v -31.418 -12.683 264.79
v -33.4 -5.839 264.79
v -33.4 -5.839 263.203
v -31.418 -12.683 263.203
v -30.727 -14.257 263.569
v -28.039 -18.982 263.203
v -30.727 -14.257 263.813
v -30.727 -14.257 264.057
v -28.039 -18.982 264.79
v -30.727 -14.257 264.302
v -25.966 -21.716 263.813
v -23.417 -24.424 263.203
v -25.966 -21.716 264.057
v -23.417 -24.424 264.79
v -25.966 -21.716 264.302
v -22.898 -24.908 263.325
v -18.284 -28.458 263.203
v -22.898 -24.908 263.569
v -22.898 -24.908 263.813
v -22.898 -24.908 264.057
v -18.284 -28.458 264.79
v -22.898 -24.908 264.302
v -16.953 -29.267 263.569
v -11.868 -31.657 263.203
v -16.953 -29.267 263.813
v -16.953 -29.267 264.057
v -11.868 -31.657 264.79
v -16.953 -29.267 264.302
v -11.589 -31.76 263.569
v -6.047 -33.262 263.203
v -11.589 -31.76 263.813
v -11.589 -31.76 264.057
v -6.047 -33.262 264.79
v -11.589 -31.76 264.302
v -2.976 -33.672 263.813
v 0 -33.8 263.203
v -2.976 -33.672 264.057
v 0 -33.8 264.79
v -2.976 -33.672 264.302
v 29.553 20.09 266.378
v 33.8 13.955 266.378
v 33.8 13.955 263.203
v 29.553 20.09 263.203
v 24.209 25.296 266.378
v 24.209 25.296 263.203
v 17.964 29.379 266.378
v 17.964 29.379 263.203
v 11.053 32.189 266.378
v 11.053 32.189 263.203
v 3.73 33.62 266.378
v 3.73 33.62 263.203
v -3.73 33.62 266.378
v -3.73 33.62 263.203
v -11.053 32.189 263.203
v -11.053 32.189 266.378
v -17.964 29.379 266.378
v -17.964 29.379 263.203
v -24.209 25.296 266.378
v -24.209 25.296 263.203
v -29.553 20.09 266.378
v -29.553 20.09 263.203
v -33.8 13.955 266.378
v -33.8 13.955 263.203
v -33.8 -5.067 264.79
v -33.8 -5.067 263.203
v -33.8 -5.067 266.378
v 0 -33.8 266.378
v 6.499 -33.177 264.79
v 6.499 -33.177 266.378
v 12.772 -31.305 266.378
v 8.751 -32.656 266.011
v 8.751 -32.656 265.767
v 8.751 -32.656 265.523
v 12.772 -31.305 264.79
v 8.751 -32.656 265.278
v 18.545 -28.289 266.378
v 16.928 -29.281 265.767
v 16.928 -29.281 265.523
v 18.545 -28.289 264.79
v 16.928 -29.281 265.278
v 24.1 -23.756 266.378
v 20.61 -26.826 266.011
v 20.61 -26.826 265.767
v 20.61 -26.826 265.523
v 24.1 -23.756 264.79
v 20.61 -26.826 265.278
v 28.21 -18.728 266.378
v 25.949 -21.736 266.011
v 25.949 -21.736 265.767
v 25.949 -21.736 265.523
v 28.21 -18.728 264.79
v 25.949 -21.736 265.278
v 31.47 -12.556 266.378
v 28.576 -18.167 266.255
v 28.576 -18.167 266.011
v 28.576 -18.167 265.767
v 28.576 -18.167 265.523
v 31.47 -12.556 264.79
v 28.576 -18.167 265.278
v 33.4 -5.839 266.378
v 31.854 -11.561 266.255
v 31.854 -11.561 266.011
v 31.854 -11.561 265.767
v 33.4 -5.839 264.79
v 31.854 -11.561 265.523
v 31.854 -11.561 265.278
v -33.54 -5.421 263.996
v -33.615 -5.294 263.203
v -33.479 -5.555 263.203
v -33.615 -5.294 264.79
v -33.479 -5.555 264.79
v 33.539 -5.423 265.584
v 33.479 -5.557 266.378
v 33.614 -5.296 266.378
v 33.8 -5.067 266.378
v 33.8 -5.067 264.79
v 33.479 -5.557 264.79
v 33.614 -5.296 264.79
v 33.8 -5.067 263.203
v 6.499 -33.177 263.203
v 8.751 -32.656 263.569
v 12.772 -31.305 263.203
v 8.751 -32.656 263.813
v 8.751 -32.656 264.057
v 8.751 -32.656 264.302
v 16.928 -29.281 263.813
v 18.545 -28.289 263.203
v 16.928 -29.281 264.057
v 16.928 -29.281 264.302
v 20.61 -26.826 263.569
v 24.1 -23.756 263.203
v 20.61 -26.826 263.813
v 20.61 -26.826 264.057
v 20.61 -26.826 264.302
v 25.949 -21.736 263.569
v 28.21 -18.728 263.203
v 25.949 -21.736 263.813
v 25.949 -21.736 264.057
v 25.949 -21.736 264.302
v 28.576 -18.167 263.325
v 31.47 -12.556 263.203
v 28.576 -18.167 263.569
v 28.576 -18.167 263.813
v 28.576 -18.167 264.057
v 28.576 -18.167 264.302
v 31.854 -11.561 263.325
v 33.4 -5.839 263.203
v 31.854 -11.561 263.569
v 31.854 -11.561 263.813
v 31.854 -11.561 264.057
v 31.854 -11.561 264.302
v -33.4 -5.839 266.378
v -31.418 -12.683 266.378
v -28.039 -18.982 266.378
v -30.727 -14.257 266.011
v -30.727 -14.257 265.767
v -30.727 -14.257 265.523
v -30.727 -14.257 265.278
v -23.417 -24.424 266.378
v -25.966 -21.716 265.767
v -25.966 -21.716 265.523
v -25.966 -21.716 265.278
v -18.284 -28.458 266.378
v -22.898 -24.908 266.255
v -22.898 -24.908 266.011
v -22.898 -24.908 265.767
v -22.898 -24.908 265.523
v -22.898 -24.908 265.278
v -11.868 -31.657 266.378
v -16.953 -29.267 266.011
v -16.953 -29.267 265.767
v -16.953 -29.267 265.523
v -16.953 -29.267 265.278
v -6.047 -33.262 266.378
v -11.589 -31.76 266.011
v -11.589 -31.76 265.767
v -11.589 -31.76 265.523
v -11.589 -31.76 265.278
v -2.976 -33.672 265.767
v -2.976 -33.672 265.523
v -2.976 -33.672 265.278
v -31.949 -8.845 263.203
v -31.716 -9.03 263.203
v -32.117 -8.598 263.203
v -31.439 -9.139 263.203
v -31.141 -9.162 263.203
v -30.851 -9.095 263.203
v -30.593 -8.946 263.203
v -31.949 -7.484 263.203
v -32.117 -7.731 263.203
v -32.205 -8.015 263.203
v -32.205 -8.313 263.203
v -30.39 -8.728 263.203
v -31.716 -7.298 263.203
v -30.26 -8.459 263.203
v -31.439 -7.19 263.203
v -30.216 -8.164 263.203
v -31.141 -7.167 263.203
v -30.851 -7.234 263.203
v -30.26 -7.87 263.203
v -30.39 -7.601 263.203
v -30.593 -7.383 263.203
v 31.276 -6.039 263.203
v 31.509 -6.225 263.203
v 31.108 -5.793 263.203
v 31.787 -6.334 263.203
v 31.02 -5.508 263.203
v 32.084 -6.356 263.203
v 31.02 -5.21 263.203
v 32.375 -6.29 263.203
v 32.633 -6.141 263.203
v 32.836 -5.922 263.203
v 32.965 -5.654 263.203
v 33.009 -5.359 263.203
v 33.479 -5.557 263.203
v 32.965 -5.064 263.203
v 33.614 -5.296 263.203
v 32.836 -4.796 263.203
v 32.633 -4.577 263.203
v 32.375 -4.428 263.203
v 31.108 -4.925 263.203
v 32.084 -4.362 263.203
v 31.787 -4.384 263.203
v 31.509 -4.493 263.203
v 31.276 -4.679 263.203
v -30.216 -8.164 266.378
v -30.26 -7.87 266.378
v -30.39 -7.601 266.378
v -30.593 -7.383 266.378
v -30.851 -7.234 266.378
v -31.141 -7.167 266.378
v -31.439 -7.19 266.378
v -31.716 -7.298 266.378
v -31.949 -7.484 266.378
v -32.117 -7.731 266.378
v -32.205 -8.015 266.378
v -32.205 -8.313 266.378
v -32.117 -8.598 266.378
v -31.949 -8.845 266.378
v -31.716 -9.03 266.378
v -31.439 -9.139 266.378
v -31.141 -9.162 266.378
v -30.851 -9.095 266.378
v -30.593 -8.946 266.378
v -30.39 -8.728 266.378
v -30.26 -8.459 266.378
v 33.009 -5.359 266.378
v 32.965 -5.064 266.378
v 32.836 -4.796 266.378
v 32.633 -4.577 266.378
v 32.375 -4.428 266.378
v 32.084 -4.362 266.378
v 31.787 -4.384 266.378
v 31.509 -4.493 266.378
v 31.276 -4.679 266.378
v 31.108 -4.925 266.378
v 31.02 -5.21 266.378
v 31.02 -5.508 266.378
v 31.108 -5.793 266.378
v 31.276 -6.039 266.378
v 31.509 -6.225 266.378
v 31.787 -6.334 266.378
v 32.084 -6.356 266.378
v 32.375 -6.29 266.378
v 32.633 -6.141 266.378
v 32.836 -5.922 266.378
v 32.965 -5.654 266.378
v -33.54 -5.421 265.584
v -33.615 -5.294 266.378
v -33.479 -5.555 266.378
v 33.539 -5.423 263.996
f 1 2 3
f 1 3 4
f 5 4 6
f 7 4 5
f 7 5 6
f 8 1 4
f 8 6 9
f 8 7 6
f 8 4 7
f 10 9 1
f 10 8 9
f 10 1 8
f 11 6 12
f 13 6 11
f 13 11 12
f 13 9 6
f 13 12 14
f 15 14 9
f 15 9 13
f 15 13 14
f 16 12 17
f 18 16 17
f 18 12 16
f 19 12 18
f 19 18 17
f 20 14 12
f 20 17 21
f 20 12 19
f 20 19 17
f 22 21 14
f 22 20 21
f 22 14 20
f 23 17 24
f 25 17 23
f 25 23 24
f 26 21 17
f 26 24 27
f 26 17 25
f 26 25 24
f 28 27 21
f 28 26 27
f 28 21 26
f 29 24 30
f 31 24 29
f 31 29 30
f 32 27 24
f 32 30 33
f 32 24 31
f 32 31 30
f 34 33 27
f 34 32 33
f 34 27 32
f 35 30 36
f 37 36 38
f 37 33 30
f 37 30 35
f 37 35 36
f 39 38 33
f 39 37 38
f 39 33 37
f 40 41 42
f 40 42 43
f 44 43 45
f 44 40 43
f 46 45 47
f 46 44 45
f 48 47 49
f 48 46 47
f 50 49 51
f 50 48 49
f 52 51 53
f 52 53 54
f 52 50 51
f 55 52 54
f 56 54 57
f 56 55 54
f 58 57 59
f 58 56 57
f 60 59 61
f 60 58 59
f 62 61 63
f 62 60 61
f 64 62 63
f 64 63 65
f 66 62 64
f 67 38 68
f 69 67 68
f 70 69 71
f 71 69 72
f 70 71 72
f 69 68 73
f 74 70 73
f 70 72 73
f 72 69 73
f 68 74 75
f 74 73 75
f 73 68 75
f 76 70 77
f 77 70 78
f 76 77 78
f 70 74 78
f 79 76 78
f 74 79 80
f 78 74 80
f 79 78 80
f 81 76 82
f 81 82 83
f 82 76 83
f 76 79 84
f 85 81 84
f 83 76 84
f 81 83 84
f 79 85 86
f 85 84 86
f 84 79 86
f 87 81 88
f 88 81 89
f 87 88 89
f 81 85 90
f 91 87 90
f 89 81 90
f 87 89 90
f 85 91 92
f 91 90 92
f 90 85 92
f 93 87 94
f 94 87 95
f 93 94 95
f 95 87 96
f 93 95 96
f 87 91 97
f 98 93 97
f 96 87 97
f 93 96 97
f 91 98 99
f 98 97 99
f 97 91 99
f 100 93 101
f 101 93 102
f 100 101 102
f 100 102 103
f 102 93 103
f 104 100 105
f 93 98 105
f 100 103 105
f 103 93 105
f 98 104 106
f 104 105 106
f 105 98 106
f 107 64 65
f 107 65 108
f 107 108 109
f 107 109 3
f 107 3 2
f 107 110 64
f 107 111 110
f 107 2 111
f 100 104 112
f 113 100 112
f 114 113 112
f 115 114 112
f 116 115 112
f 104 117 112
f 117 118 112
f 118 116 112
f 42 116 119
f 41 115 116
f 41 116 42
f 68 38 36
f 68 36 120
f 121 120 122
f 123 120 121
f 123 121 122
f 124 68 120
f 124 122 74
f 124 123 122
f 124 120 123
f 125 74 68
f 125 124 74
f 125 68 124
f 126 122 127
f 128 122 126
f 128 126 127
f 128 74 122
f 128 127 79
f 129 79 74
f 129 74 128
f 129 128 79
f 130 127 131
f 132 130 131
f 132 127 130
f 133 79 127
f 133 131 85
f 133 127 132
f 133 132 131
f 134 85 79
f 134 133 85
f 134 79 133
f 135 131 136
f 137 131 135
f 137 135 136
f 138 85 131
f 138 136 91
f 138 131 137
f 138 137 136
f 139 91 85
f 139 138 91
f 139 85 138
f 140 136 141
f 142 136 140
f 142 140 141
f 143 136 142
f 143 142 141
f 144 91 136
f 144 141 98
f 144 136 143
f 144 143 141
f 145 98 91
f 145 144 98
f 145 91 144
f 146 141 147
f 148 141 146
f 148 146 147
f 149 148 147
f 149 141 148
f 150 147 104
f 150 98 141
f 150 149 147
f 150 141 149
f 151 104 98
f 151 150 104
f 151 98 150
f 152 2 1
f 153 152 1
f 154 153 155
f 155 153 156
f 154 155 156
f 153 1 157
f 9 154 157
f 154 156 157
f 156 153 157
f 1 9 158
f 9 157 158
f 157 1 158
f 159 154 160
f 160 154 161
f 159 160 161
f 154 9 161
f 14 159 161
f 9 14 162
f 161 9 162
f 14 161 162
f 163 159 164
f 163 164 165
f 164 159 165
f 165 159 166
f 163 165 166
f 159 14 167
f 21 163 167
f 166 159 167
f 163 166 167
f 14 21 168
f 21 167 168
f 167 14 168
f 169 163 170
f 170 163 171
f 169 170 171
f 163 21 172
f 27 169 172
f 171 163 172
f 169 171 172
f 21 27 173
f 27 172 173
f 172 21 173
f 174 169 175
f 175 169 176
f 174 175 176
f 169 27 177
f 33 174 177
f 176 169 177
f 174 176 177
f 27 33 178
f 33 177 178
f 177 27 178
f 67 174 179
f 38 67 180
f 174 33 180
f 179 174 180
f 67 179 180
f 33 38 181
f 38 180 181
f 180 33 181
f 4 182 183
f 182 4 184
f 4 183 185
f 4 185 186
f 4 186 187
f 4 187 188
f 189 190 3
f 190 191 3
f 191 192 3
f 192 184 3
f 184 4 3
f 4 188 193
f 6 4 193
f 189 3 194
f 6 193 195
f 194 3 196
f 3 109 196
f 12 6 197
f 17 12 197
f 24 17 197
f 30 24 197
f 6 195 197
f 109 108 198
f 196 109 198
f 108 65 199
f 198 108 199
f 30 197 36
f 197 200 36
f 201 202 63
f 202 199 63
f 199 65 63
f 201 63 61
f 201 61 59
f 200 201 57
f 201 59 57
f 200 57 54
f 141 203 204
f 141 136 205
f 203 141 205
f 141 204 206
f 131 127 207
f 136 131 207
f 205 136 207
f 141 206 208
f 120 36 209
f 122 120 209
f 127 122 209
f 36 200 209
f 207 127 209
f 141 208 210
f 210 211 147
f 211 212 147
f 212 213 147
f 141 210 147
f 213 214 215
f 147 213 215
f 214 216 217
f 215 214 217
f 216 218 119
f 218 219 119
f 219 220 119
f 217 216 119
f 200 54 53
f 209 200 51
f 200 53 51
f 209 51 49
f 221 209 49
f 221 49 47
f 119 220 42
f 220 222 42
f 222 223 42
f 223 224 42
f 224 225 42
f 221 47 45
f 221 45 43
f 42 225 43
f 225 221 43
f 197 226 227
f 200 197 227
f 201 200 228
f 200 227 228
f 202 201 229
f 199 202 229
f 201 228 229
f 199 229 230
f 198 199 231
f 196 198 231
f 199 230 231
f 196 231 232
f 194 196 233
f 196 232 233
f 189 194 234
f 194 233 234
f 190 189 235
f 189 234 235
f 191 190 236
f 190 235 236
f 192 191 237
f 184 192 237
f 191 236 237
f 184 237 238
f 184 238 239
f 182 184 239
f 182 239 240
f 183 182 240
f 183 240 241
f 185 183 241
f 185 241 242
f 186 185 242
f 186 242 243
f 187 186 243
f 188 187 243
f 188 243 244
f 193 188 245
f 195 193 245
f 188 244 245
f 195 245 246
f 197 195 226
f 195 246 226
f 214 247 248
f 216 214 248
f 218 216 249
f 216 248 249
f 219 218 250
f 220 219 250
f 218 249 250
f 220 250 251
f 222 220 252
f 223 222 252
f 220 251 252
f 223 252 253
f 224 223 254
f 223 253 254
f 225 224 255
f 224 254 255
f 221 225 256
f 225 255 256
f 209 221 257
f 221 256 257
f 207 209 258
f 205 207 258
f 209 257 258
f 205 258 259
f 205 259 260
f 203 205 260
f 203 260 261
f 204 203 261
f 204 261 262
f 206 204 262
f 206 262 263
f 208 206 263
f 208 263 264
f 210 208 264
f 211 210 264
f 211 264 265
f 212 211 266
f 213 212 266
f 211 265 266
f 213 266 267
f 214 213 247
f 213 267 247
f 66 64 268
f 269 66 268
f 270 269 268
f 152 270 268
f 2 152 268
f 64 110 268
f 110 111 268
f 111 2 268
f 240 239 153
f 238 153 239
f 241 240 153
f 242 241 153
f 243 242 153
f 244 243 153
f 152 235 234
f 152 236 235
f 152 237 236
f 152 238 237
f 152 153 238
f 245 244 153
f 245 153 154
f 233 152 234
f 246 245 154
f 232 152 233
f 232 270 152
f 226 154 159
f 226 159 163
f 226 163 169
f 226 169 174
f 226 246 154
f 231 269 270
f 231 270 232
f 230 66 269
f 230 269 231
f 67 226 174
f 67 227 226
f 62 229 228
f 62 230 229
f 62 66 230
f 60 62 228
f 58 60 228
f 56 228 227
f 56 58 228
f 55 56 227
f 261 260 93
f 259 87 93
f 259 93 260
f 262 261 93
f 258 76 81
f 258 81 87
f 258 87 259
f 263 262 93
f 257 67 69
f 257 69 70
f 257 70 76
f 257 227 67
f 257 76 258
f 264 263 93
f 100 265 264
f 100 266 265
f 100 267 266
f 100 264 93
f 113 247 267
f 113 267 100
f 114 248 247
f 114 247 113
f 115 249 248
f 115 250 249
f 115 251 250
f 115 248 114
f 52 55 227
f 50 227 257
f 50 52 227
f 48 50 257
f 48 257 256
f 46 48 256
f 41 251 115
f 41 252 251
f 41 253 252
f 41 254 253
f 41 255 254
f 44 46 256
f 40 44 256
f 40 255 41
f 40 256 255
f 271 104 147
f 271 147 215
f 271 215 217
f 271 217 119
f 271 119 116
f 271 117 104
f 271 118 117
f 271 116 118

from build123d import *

# Parameters (mm, degrees)
BOSS_EXTRUDE1_DEPTH = 1.5875
SKETCH3_R           = 1
CUT_EXTRUDE2_DEPTH  = 3.175


with BuildPart() as part:
    # Sketch1 → Boss-Extrude1 (new, symmetric)
    with BuildSketch(Plane.XY.offset(264.790013628)):
        with BuildLine():
            Line((33.800017398, -5.067355161), (33.800017398, 13.955458653))
            ThreePointArc((33.800017398, 13.955458653), (0, 33.800390955), (-33.800017398, 13.955458653))
            Line((-33.800017398, 13.955458653), (-33.800017398, -5.067355161))
            add(Edge.make_bspline(
                [(-33.800017398, -5.067355161), (-33.694935477, -5.172128399), (-33.608288469, -5.290004795), (-33.472323961, -5.552290639), (-33.425425948, -5.692889236), (-33.399533932, -5.838970624)],
                knots=[0, 0, 0, 0, 0.5, 0.5, 1, 1, 1, 1], degree=3))
            add(Edge.make_bspline(
                [(-33.399533932, -5.838970624), (-33.052253285, -7.798309693), (-32.28122422, -10.647467269), (-31.145731134, -13.365691593), (-30.518165219, -14.703313718), (-30.29902031, -15.145610982), (-29.840887044, -16.023076775), (-29.601228036, -16.459250859), (-28.359208449, -18.607369492), (-27.22981433, -20.215826589), (-25.018856718, -22.840568094), (-23.995930567, -23.90437348), (-22.532682873, -25.242268373), (-22.158108065, -25.570446836), (-20.260791979, -27.161701153), (-18.652171115, -28.2877371), (-16.102983861, -29.756171424), (-15.230549353, -30.208885919), (-13.44029889, -31.040835285), (-12.518244043, -31.421602723), (-9.730335127, -32.436850643), (-7.835048114, -32.947048229), (-4.936180491, -33.458234156), (-3.960569712, -33.586283528), (-1.990568761, -33.757071458), (-0.994552943, -33.799592721), (7.014e-06, -33.799609106)],
                knots=[0, 0, 0, 0, 0.125, 0.1875, 0.1875, 0.21875, 0.21875, 0.25, 0.25, 0.375, 0.375, 0.46875, 0.46875, 0.5, 0.5, 0.625, 0.625, 0.6875, 0.6875, 0.75, 0.75, 0.875, 0.875, 0.9375, 0.9375, 1, 1, 1, 1], degree=3))
            add(Edge.make_bspline(
                [(7.014e-06, -33.799609106), (1.987875992, -33.799575566), (3.94703991, -33.631115611), (6.842232548, -33.122877847), (8.278942061, -32.804880827), (9.699244221, -32.390613968), (10.642458673, -32.092998308), (11.113286404, -31.933080905), (13.444877358, -31.084762204), (15.228063078, -30.258192227), (18.202438097, -28.548252781), (19.430049544, -27.730513432), (21.002878368, -26.524895287), (21.391487804, -26.213219806), (23.290603811, -24.621354585), (24.683841541, -23.235802325), (26.897817983, -20.611786452), (27.77410108, -19.422700527), (28.842940769, -17.748765821), (29.101464741, -17.323406575), (30.340761198, -15.181007143), (31.176382916, -13.403126413), (32.193288505, -10.639212594), (32.492355328, -9.701528607), (33.008528869, -7.792516567), (33.225825771, -6.819022893), (33.399533932, -5.838970624)],
                knots=[0, 0, 0, 0, 0.125, 0.125, 0.1875, 0.21875, 0.21875, 0.25, 0.25, 0.375, 0.375, 0.46875, 0.46875, 0.5, 0.5, 0.625, 0.625, 0.71875, 0.71875, 0.75, 0.75, 0.875, 0.875, 0.9375, 0.9375, 1, 1, 1, 1], degree=3))
            add(Edge.make_bspline(
                [(33.399533932, -5.838970624), (33.425419923, -5.692923228), (33.471627634, -5.554074987), (33.607200861, -5.29166755), (33.694927142, -5.172136709), (33.800017398, -5.067355161)],
                knots=[0, 0, 0, 0, 0.5, 0.5, 1, 1, 1, 1], degree=3))
        make_face()
    extrude(amount=BOSS_EXTRUDE1_DEPTH, both=True)

    # Sketch3 → Cut-Extrude2 (cut)
    with BuildSketch(Plane.XY.offset(266.377513628)):
        with Locations((-31.216064399, -8.164436653)):
            Circle(SKETCH3_R)
        with Locations((32.009302375, -5.358989516)):
            Circle(SKETCH3_R)
    extrude(amount=-CUT_EXTRUDE2_DEPTH, mode=Mode.SUBTRACT)


solid = part.part
